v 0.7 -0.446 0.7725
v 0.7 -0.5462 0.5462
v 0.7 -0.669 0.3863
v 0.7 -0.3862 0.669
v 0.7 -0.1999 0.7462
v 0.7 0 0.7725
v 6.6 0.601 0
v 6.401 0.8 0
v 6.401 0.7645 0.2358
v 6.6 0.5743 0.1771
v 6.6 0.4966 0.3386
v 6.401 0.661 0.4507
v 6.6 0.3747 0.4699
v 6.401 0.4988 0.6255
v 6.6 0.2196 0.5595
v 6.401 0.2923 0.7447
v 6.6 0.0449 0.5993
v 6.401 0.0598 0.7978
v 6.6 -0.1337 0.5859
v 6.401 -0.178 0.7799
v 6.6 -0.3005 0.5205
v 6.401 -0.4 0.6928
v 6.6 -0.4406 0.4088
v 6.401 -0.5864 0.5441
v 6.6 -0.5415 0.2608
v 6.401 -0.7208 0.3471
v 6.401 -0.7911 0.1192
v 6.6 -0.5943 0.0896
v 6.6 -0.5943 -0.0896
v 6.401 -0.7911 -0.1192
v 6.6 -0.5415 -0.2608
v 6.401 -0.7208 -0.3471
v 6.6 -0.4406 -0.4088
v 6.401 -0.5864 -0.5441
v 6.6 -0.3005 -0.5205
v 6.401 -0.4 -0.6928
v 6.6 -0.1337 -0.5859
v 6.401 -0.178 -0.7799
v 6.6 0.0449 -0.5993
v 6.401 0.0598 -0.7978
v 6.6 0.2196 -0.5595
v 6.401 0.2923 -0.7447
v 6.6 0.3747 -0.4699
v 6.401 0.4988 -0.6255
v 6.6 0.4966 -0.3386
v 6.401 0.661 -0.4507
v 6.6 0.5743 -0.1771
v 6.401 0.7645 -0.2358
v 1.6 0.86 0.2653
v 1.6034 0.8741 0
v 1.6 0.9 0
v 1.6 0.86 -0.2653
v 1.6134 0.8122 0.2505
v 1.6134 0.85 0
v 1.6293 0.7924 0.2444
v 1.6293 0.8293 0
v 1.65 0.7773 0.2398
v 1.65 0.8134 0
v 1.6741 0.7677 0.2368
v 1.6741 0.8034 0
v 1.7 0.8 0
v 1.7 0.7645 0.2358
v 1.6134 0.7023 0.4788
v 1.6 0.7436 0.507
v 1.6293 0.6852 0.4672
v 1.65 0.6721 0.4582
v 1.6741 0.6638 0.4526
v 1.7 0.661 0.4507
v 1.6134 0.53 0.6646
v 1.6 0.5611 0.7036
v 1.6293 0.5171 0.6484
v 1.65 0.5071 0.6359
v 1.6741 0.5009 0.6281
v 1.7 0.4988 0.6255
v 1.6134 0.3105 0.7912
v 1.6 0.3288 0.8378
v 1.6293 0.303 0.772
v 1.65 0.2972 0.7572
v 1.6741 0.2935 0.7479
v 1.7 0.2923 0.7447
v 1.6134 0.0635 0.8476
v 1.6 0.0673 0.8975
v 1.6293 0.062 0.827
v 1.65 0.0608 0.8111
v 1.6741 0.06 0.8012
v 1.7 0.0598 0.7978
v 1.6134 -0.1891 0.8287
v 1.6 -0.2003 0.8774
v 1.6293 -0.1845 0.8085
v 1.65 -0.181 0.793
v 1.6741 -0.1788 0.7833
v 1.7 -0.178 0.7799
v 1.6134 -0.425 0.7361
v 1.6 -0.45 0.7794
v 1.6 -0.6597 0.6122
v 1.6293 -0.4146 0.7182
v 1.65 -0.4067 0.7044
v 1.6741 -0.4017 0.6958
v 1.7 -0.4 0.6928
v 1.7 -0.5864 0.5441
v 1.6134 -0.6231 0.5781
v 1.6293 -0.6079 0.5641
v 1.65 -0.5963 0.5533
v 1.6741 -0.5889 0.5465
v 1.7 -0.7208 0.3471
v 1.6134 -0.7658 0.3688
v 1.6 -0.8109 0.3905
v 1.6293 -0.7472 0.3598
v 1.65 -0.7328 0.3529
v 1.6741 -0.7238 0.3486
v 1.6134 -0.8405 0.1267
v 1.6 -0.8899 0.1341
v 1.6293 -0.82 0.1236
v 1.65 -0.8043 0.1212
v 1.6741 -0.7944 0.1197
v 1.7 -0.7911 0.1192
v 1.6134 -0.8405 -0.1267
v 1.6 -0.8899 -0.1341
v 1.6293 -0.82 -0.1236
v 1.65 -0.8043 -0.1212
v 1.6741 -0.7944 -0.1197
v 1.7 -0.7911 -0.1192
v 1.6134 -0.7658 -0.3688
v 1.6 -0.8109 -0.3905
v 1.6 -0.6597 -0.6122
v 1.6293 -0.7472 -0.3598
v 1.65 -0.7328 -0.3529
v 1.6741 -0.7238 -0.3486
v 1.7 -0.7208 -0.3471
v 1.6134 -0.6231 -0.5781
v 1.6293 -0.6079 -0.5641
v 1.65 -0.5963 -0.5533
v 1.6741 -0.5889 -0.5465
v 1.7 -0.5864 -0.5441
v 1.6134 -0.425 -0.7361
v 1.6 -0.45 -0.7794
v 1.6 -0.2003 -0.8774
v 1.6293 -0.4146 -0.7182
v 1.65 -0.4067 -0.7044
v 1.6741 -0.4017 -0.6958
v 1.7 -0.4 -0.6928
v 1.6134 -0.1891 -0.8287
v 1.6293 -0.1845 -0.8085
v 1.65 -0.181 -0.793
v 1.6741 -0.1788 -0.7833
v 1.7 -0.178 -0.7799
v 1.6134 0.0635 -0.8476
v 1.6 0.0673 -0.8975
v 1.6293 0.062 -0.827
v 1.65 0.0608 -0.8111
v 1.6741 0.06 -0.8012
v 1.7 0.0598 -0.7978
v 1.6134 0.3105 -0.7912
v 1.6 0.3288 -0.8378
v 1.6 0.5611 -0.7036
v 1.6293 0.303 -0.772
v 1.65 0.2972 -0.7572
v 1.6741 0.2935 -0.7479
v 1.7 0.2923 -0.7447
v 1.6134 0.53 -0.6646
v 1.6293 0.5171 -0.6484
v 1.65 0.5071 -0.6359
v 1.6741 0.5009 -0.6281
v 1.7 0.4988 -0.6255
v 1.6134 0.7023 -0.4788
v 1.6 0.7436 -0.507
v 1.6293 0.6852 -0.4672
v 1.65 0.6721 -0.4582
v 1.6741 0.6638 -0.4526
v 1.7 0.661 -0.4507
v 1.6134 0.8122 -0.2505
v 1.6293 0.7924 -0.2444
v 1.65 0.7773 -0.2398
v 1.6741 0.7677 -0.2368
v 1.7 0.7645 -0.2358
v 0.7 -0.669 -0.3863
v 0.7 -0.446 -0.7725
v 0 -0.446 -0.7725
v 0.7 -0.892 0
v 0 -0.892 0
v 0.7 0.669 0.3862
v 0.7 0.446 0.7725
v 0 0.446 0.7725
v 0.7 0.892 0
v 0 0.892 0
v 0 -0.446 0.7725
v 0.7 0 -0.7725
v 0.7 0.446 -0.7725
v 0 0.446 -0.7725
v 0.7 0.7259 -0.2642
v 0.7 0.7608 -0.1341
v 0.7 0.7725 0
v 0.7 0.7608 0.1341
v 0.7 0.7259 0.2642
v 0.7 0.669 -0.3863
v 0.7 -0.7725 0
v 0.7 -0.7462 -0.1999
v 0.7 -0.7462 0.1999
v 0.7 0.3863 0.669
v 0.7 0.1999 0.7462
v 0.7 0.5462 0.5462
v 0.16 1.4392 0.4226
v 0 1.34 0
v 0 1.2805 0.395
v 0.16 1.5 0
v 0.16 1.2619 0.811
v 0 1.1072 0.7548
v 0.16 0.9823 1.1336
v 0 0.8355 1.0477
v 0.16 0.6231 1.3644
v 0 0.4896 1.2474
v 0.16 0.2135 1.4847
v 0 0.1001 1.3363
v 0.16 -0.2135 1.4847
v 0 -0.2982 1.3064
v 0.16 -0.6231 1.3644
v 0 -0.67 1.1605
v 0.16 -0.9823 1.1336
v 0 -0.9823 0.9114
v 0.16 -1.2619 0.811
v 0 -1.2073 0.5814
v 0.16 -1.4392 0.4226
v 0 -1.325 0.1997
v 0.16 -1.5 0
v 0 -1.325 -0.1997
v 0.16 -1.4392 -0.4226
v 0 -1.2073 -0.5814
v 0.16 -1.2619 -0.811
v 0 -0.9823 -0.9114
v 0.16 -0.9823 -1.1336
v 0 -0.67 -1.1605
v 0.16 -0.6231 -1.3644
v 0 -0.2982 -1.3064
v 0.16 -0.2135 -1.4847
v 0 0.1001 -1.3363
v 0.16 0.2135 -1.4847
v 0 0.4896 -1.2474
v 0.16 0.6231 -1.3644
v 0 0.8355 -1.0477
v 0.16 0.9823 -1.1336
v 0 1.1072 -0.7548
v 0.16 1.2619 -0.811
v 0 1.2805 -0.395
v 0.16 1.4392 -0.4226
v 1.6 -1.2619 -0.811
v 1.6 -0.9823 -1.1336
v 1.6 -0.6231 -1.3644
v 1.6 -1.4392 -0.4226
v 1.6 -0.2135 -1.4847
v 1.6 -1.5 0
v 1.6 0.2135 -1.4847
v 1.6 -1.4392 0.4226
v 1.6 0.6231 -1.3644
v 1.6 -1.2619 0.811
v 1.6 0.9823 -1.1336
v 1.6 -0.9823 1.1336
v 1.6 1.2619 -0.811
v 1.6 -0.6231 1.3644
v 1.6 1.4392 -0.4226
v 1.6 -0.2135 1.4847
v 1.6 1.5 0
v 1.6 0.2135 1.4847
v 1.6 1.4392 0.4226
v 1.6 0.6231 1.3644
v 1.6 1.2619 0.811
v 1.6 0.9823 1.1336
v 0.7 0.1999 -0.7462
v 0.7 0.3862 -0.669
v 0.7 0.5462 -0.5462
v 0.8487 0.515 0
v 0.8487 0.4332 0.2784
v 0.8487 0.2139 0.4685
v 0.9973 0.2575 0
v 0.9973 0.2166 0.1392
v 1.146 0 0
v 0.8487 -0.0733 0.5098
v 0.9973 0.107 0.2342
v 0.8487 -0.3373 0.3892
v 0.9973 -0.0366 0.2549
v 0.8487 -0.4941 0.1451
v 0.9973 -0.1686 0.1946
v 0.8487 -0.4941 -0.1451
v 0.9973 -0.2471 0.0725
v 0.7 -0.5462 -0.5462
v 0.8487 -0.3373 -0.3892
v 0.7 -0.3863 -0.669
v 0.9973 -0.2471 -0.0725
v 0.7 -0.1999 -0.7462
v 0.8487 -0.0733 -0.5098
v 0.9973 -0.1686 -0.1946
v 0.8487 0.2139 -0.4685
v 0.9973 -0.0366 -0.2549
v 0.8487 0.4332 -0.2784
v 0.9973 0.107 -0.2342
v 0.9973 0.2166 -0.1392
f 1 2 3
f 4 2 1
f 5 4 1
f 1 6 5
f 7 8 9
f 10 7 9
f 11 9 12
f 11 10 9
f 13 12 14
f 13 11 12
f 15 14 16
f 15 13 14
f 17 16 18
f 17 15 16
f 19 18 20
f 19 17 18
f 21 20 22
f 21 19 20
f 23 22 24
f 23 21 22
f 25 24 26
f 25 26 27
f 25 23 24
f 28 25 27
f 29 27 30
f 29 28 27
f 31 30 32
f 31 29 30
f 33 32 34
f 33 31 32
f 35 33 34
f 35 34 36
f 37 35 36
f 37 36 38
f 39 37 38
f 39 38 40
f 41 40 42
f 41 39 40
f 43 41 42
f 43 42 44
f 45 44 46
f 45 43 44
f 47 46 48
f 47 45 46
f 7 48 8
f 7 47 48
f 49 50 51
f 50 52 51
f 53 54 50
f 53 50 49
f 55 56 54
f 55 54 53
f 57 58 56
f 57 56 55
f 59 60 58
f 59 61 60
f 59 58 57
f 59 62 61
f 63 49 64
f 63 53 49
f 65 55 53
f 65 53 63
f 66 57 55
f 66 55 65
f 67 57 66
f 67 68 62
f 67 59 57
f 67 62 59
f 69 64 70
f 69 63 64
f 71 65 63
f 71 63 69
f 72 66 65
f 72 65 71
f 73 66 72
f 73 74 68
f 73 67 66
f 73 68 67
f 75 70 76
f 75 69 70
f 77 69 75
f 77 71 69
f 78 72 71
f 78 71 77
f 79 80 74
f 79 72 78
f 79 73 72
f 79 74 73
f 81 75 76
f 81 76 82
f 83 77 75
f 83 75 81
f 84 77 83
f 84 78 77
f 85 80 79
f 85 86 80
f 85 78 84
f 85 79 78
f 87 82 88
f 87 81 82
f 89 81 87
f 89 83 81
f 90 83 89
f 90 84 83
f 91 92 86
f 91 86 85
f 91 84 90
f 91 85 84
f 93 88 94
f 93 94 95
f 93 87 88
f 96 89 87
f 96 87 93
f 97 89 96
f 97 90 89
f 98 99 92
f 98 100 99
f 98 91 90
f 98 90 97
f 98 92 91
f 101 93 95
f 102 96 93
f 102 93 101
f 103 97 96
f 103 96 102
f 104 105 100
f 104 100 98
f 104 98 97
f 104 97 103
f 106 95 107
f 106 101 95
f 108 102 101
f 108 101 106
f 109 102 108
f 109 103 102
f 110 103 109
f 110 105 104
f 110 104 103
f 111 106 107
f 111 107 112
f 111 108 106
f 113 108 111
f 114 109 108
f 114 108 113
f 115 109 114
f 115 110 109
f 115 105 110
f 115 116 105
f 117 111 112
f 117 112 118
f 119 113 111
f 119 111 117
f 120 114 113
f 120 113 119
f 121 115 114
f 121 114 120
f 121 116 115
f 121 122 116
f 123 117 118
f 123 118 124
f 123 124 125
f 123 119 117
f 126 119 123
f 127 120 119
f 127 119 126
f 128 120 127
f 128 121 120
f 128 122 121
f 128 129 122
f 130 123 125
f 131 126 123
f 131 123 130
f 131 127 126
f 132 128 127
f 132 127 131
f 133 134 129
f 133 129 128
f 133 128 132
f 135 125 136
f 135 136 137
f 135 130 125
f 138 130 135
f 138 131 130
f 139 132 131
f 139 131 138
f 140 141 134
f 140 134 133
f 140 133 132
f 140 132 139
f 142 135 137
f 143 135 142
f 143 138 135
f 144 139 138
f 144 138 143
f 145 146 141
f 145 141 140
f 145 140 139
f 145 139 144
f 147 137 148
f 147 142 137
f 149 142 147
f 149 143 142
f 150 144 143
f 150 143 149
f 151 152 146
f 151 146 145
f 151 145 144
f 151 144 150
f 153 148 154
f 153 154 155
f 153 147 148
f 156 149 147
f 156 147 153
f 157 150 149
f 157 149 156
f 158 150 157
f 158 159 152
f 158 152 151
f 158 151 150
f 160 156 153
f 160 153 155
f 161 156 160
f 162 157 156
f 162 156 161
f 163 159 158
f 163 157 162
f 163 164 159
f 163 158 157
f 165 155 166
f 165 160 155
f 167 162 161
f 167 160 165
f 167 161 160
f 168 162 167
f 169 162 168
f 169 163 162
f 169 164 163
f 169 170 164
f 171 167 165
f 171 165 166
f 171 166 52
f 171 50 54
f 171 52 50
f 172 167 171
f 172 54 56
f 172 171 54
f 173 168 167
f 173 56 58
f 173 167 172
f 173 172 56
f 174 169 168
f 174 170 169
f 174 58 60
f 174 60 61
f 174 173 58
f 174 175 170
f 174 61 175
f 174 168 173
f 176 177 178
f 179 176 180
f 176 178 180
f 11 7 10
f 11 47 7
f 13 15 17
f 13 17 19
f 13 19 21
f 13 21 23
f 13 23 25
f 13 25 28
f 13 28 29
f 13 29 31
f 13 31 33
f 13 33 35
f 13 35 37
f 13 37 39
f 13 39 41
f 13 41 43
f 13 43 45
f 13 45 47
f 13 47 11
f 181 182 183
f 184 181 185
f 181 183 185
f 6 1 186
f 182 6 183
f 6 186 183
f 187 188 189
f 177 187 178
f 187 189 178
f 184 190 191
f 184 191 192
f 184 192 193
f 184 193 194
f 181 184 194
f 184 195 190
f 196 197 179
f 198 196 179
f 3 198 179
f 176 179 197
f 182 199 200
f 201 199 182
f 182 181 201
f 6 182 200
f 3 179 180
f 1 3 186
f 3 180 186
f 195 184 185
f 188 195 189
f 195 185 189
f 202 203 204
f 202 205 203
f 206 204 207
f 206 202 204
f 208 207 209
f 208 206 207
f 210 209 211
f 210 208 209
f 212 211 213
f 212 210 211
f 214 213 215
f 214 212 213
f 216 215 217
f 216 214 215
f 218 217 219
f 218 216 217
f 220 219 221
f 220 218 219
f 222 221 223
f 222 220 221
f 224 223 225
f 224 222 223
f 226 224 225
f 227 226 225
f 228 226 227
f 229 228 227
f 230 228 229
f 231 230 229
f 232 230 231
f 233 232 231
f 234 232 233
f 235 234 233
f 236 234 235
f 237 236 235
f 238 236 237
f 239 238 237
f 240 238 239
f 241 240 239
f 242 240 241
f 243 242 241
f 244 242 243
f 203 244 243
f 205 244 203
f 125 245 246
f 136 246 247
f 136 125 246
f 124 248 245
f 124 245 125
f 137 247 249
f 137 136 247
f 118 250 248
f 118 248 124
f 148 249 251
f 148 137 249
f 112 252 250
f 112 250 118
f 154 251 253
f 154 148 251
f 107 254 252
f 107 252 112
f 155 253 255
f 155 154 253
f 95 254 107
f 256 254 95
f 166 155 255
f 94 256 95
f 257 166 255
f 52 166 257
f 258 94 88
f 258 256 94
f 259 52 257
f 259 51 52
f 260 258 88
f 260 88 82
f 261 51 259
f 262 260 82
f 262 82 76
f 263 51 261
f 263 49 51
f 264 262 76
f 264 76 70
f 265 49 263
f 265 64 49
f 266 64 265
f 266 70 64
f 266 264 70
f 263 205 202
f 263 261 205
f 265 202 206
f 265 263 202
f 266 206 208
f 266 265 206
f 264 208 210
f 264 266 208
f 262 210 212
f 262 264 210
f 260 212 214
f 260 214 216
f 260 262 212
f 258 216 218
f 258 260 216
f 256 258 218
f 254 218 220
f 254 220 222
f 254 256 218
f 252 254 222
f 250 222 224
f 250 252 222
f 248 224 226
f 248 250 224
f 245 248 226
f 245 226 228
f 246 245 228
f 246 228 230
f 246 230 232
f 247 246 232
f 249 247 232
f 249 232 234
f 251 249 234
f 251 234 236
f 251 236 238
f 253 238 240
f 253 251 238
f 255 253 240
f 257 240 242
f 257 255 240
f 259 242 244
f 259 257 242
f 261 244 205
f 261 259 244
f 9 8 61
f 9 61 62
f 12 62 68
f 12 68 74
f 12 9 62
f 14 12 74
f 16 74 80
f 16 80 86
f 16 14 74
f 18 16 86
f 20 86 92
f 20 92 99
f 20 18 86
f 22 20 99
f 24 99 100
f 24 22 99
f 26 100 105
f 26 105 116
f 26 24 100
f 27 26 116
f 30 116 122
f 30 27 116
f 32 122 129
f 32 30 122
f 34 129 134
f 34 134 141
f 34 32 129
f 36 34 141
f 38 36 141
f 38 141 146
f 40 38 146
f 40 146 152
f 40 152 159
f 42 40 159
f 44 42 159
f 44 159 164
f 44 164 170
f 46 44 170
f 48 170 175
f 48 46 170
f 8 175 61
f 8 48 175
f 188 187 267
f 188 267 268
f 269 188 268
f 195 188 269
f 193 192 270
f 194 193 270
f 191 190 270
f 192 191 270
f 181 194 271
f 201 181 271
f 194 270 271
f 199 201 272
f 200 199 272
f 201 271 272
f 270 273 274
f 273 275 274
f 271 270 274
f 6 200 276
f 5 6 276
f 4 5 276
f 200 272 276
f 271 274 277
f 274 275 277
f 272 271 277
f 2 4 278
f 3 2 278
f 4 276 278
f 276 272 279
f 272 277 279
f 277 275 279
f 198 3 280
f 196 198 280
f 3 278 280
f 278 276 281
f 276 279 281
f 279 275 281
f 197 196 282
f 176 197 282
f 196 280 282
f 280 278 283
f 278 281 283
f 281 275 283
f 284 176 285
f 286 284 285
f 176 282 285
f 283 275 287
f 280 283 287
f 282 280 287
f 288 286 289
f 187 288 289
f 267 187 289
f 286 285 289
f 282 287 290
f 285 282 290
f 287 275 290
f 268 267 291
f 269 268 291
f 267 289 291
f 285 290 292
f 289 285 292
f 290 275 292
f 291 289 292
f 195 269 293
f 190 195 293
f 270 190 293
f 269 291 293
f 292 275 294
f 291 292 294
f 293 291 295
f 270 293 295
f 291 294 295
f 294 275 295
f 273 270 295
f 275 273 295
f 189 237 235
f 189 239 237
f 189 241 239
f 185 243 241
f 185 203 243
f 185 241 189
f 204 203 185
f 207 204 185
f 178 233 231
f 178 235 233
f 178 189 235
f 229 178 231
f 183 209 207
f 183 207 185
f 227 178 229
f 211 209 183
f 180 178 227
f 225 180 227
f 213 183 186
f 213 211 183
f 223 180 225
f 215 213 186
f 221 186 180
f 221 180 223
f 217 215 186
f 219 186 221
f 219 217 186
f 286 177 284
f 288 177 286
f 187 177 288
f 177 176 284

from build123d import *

# Parameters (mm, degrees)
FILLET1_R   = 0.1
HEX_2_DEPTH = 0.7


with BuildPart() as part:
    # BodySke → Base-Revolve (revolve)
    with BuildSketch(Plane.XY):
        Polygon((0, 0), (0, 1.34), (0.16, 1.5), (1.6, 1.5), (1.6, 0.8), (6.401, 0.8), (6.6, 0.601), (6.6, 0), align=None)
    revolve(axis=Axis((-31.75, 0, 0), (1, 0, 0)))

    # Fillet1
    fillet1_edges = [part.edges().sort_by_distance(p)[0] for p in [
        (1.6, -0.8, 0),
    ]]
    fillet(fillet1_edges, radius=FILLET1_R)

    # Sketch2 → Hex-PreBroach (revolve, cut)
    with BuildSketch(Plane.XY):
        Polygon((0, 0.7725), (0.7, 0.7725), (1.146003083, 0), (0, 0), align=None)
    revolve(axis=Axis((0, 0, 0), (1, 0, 0)), mode=Mode.SUBTRACT)

    # Sketch3 → Hex 2 (cut)
    with BuildSketch(Plane(origin=(0, 0, 0), x_dir=(0, 0.5, 0.866025404), z_dir=(-1, 0, 0))):
        Polygon((0.446003083, 0.7725), (-0.446003083, 0.7725), (-0.892006166, 0), (-0.446003083, -0.7725), (0.446003083, -0.7725), (0.892006166, 0), align=None)
    extrude(amount=-HEX_2_DEPTH, mode=Mode.SUBTRACT)


solid = part.part
